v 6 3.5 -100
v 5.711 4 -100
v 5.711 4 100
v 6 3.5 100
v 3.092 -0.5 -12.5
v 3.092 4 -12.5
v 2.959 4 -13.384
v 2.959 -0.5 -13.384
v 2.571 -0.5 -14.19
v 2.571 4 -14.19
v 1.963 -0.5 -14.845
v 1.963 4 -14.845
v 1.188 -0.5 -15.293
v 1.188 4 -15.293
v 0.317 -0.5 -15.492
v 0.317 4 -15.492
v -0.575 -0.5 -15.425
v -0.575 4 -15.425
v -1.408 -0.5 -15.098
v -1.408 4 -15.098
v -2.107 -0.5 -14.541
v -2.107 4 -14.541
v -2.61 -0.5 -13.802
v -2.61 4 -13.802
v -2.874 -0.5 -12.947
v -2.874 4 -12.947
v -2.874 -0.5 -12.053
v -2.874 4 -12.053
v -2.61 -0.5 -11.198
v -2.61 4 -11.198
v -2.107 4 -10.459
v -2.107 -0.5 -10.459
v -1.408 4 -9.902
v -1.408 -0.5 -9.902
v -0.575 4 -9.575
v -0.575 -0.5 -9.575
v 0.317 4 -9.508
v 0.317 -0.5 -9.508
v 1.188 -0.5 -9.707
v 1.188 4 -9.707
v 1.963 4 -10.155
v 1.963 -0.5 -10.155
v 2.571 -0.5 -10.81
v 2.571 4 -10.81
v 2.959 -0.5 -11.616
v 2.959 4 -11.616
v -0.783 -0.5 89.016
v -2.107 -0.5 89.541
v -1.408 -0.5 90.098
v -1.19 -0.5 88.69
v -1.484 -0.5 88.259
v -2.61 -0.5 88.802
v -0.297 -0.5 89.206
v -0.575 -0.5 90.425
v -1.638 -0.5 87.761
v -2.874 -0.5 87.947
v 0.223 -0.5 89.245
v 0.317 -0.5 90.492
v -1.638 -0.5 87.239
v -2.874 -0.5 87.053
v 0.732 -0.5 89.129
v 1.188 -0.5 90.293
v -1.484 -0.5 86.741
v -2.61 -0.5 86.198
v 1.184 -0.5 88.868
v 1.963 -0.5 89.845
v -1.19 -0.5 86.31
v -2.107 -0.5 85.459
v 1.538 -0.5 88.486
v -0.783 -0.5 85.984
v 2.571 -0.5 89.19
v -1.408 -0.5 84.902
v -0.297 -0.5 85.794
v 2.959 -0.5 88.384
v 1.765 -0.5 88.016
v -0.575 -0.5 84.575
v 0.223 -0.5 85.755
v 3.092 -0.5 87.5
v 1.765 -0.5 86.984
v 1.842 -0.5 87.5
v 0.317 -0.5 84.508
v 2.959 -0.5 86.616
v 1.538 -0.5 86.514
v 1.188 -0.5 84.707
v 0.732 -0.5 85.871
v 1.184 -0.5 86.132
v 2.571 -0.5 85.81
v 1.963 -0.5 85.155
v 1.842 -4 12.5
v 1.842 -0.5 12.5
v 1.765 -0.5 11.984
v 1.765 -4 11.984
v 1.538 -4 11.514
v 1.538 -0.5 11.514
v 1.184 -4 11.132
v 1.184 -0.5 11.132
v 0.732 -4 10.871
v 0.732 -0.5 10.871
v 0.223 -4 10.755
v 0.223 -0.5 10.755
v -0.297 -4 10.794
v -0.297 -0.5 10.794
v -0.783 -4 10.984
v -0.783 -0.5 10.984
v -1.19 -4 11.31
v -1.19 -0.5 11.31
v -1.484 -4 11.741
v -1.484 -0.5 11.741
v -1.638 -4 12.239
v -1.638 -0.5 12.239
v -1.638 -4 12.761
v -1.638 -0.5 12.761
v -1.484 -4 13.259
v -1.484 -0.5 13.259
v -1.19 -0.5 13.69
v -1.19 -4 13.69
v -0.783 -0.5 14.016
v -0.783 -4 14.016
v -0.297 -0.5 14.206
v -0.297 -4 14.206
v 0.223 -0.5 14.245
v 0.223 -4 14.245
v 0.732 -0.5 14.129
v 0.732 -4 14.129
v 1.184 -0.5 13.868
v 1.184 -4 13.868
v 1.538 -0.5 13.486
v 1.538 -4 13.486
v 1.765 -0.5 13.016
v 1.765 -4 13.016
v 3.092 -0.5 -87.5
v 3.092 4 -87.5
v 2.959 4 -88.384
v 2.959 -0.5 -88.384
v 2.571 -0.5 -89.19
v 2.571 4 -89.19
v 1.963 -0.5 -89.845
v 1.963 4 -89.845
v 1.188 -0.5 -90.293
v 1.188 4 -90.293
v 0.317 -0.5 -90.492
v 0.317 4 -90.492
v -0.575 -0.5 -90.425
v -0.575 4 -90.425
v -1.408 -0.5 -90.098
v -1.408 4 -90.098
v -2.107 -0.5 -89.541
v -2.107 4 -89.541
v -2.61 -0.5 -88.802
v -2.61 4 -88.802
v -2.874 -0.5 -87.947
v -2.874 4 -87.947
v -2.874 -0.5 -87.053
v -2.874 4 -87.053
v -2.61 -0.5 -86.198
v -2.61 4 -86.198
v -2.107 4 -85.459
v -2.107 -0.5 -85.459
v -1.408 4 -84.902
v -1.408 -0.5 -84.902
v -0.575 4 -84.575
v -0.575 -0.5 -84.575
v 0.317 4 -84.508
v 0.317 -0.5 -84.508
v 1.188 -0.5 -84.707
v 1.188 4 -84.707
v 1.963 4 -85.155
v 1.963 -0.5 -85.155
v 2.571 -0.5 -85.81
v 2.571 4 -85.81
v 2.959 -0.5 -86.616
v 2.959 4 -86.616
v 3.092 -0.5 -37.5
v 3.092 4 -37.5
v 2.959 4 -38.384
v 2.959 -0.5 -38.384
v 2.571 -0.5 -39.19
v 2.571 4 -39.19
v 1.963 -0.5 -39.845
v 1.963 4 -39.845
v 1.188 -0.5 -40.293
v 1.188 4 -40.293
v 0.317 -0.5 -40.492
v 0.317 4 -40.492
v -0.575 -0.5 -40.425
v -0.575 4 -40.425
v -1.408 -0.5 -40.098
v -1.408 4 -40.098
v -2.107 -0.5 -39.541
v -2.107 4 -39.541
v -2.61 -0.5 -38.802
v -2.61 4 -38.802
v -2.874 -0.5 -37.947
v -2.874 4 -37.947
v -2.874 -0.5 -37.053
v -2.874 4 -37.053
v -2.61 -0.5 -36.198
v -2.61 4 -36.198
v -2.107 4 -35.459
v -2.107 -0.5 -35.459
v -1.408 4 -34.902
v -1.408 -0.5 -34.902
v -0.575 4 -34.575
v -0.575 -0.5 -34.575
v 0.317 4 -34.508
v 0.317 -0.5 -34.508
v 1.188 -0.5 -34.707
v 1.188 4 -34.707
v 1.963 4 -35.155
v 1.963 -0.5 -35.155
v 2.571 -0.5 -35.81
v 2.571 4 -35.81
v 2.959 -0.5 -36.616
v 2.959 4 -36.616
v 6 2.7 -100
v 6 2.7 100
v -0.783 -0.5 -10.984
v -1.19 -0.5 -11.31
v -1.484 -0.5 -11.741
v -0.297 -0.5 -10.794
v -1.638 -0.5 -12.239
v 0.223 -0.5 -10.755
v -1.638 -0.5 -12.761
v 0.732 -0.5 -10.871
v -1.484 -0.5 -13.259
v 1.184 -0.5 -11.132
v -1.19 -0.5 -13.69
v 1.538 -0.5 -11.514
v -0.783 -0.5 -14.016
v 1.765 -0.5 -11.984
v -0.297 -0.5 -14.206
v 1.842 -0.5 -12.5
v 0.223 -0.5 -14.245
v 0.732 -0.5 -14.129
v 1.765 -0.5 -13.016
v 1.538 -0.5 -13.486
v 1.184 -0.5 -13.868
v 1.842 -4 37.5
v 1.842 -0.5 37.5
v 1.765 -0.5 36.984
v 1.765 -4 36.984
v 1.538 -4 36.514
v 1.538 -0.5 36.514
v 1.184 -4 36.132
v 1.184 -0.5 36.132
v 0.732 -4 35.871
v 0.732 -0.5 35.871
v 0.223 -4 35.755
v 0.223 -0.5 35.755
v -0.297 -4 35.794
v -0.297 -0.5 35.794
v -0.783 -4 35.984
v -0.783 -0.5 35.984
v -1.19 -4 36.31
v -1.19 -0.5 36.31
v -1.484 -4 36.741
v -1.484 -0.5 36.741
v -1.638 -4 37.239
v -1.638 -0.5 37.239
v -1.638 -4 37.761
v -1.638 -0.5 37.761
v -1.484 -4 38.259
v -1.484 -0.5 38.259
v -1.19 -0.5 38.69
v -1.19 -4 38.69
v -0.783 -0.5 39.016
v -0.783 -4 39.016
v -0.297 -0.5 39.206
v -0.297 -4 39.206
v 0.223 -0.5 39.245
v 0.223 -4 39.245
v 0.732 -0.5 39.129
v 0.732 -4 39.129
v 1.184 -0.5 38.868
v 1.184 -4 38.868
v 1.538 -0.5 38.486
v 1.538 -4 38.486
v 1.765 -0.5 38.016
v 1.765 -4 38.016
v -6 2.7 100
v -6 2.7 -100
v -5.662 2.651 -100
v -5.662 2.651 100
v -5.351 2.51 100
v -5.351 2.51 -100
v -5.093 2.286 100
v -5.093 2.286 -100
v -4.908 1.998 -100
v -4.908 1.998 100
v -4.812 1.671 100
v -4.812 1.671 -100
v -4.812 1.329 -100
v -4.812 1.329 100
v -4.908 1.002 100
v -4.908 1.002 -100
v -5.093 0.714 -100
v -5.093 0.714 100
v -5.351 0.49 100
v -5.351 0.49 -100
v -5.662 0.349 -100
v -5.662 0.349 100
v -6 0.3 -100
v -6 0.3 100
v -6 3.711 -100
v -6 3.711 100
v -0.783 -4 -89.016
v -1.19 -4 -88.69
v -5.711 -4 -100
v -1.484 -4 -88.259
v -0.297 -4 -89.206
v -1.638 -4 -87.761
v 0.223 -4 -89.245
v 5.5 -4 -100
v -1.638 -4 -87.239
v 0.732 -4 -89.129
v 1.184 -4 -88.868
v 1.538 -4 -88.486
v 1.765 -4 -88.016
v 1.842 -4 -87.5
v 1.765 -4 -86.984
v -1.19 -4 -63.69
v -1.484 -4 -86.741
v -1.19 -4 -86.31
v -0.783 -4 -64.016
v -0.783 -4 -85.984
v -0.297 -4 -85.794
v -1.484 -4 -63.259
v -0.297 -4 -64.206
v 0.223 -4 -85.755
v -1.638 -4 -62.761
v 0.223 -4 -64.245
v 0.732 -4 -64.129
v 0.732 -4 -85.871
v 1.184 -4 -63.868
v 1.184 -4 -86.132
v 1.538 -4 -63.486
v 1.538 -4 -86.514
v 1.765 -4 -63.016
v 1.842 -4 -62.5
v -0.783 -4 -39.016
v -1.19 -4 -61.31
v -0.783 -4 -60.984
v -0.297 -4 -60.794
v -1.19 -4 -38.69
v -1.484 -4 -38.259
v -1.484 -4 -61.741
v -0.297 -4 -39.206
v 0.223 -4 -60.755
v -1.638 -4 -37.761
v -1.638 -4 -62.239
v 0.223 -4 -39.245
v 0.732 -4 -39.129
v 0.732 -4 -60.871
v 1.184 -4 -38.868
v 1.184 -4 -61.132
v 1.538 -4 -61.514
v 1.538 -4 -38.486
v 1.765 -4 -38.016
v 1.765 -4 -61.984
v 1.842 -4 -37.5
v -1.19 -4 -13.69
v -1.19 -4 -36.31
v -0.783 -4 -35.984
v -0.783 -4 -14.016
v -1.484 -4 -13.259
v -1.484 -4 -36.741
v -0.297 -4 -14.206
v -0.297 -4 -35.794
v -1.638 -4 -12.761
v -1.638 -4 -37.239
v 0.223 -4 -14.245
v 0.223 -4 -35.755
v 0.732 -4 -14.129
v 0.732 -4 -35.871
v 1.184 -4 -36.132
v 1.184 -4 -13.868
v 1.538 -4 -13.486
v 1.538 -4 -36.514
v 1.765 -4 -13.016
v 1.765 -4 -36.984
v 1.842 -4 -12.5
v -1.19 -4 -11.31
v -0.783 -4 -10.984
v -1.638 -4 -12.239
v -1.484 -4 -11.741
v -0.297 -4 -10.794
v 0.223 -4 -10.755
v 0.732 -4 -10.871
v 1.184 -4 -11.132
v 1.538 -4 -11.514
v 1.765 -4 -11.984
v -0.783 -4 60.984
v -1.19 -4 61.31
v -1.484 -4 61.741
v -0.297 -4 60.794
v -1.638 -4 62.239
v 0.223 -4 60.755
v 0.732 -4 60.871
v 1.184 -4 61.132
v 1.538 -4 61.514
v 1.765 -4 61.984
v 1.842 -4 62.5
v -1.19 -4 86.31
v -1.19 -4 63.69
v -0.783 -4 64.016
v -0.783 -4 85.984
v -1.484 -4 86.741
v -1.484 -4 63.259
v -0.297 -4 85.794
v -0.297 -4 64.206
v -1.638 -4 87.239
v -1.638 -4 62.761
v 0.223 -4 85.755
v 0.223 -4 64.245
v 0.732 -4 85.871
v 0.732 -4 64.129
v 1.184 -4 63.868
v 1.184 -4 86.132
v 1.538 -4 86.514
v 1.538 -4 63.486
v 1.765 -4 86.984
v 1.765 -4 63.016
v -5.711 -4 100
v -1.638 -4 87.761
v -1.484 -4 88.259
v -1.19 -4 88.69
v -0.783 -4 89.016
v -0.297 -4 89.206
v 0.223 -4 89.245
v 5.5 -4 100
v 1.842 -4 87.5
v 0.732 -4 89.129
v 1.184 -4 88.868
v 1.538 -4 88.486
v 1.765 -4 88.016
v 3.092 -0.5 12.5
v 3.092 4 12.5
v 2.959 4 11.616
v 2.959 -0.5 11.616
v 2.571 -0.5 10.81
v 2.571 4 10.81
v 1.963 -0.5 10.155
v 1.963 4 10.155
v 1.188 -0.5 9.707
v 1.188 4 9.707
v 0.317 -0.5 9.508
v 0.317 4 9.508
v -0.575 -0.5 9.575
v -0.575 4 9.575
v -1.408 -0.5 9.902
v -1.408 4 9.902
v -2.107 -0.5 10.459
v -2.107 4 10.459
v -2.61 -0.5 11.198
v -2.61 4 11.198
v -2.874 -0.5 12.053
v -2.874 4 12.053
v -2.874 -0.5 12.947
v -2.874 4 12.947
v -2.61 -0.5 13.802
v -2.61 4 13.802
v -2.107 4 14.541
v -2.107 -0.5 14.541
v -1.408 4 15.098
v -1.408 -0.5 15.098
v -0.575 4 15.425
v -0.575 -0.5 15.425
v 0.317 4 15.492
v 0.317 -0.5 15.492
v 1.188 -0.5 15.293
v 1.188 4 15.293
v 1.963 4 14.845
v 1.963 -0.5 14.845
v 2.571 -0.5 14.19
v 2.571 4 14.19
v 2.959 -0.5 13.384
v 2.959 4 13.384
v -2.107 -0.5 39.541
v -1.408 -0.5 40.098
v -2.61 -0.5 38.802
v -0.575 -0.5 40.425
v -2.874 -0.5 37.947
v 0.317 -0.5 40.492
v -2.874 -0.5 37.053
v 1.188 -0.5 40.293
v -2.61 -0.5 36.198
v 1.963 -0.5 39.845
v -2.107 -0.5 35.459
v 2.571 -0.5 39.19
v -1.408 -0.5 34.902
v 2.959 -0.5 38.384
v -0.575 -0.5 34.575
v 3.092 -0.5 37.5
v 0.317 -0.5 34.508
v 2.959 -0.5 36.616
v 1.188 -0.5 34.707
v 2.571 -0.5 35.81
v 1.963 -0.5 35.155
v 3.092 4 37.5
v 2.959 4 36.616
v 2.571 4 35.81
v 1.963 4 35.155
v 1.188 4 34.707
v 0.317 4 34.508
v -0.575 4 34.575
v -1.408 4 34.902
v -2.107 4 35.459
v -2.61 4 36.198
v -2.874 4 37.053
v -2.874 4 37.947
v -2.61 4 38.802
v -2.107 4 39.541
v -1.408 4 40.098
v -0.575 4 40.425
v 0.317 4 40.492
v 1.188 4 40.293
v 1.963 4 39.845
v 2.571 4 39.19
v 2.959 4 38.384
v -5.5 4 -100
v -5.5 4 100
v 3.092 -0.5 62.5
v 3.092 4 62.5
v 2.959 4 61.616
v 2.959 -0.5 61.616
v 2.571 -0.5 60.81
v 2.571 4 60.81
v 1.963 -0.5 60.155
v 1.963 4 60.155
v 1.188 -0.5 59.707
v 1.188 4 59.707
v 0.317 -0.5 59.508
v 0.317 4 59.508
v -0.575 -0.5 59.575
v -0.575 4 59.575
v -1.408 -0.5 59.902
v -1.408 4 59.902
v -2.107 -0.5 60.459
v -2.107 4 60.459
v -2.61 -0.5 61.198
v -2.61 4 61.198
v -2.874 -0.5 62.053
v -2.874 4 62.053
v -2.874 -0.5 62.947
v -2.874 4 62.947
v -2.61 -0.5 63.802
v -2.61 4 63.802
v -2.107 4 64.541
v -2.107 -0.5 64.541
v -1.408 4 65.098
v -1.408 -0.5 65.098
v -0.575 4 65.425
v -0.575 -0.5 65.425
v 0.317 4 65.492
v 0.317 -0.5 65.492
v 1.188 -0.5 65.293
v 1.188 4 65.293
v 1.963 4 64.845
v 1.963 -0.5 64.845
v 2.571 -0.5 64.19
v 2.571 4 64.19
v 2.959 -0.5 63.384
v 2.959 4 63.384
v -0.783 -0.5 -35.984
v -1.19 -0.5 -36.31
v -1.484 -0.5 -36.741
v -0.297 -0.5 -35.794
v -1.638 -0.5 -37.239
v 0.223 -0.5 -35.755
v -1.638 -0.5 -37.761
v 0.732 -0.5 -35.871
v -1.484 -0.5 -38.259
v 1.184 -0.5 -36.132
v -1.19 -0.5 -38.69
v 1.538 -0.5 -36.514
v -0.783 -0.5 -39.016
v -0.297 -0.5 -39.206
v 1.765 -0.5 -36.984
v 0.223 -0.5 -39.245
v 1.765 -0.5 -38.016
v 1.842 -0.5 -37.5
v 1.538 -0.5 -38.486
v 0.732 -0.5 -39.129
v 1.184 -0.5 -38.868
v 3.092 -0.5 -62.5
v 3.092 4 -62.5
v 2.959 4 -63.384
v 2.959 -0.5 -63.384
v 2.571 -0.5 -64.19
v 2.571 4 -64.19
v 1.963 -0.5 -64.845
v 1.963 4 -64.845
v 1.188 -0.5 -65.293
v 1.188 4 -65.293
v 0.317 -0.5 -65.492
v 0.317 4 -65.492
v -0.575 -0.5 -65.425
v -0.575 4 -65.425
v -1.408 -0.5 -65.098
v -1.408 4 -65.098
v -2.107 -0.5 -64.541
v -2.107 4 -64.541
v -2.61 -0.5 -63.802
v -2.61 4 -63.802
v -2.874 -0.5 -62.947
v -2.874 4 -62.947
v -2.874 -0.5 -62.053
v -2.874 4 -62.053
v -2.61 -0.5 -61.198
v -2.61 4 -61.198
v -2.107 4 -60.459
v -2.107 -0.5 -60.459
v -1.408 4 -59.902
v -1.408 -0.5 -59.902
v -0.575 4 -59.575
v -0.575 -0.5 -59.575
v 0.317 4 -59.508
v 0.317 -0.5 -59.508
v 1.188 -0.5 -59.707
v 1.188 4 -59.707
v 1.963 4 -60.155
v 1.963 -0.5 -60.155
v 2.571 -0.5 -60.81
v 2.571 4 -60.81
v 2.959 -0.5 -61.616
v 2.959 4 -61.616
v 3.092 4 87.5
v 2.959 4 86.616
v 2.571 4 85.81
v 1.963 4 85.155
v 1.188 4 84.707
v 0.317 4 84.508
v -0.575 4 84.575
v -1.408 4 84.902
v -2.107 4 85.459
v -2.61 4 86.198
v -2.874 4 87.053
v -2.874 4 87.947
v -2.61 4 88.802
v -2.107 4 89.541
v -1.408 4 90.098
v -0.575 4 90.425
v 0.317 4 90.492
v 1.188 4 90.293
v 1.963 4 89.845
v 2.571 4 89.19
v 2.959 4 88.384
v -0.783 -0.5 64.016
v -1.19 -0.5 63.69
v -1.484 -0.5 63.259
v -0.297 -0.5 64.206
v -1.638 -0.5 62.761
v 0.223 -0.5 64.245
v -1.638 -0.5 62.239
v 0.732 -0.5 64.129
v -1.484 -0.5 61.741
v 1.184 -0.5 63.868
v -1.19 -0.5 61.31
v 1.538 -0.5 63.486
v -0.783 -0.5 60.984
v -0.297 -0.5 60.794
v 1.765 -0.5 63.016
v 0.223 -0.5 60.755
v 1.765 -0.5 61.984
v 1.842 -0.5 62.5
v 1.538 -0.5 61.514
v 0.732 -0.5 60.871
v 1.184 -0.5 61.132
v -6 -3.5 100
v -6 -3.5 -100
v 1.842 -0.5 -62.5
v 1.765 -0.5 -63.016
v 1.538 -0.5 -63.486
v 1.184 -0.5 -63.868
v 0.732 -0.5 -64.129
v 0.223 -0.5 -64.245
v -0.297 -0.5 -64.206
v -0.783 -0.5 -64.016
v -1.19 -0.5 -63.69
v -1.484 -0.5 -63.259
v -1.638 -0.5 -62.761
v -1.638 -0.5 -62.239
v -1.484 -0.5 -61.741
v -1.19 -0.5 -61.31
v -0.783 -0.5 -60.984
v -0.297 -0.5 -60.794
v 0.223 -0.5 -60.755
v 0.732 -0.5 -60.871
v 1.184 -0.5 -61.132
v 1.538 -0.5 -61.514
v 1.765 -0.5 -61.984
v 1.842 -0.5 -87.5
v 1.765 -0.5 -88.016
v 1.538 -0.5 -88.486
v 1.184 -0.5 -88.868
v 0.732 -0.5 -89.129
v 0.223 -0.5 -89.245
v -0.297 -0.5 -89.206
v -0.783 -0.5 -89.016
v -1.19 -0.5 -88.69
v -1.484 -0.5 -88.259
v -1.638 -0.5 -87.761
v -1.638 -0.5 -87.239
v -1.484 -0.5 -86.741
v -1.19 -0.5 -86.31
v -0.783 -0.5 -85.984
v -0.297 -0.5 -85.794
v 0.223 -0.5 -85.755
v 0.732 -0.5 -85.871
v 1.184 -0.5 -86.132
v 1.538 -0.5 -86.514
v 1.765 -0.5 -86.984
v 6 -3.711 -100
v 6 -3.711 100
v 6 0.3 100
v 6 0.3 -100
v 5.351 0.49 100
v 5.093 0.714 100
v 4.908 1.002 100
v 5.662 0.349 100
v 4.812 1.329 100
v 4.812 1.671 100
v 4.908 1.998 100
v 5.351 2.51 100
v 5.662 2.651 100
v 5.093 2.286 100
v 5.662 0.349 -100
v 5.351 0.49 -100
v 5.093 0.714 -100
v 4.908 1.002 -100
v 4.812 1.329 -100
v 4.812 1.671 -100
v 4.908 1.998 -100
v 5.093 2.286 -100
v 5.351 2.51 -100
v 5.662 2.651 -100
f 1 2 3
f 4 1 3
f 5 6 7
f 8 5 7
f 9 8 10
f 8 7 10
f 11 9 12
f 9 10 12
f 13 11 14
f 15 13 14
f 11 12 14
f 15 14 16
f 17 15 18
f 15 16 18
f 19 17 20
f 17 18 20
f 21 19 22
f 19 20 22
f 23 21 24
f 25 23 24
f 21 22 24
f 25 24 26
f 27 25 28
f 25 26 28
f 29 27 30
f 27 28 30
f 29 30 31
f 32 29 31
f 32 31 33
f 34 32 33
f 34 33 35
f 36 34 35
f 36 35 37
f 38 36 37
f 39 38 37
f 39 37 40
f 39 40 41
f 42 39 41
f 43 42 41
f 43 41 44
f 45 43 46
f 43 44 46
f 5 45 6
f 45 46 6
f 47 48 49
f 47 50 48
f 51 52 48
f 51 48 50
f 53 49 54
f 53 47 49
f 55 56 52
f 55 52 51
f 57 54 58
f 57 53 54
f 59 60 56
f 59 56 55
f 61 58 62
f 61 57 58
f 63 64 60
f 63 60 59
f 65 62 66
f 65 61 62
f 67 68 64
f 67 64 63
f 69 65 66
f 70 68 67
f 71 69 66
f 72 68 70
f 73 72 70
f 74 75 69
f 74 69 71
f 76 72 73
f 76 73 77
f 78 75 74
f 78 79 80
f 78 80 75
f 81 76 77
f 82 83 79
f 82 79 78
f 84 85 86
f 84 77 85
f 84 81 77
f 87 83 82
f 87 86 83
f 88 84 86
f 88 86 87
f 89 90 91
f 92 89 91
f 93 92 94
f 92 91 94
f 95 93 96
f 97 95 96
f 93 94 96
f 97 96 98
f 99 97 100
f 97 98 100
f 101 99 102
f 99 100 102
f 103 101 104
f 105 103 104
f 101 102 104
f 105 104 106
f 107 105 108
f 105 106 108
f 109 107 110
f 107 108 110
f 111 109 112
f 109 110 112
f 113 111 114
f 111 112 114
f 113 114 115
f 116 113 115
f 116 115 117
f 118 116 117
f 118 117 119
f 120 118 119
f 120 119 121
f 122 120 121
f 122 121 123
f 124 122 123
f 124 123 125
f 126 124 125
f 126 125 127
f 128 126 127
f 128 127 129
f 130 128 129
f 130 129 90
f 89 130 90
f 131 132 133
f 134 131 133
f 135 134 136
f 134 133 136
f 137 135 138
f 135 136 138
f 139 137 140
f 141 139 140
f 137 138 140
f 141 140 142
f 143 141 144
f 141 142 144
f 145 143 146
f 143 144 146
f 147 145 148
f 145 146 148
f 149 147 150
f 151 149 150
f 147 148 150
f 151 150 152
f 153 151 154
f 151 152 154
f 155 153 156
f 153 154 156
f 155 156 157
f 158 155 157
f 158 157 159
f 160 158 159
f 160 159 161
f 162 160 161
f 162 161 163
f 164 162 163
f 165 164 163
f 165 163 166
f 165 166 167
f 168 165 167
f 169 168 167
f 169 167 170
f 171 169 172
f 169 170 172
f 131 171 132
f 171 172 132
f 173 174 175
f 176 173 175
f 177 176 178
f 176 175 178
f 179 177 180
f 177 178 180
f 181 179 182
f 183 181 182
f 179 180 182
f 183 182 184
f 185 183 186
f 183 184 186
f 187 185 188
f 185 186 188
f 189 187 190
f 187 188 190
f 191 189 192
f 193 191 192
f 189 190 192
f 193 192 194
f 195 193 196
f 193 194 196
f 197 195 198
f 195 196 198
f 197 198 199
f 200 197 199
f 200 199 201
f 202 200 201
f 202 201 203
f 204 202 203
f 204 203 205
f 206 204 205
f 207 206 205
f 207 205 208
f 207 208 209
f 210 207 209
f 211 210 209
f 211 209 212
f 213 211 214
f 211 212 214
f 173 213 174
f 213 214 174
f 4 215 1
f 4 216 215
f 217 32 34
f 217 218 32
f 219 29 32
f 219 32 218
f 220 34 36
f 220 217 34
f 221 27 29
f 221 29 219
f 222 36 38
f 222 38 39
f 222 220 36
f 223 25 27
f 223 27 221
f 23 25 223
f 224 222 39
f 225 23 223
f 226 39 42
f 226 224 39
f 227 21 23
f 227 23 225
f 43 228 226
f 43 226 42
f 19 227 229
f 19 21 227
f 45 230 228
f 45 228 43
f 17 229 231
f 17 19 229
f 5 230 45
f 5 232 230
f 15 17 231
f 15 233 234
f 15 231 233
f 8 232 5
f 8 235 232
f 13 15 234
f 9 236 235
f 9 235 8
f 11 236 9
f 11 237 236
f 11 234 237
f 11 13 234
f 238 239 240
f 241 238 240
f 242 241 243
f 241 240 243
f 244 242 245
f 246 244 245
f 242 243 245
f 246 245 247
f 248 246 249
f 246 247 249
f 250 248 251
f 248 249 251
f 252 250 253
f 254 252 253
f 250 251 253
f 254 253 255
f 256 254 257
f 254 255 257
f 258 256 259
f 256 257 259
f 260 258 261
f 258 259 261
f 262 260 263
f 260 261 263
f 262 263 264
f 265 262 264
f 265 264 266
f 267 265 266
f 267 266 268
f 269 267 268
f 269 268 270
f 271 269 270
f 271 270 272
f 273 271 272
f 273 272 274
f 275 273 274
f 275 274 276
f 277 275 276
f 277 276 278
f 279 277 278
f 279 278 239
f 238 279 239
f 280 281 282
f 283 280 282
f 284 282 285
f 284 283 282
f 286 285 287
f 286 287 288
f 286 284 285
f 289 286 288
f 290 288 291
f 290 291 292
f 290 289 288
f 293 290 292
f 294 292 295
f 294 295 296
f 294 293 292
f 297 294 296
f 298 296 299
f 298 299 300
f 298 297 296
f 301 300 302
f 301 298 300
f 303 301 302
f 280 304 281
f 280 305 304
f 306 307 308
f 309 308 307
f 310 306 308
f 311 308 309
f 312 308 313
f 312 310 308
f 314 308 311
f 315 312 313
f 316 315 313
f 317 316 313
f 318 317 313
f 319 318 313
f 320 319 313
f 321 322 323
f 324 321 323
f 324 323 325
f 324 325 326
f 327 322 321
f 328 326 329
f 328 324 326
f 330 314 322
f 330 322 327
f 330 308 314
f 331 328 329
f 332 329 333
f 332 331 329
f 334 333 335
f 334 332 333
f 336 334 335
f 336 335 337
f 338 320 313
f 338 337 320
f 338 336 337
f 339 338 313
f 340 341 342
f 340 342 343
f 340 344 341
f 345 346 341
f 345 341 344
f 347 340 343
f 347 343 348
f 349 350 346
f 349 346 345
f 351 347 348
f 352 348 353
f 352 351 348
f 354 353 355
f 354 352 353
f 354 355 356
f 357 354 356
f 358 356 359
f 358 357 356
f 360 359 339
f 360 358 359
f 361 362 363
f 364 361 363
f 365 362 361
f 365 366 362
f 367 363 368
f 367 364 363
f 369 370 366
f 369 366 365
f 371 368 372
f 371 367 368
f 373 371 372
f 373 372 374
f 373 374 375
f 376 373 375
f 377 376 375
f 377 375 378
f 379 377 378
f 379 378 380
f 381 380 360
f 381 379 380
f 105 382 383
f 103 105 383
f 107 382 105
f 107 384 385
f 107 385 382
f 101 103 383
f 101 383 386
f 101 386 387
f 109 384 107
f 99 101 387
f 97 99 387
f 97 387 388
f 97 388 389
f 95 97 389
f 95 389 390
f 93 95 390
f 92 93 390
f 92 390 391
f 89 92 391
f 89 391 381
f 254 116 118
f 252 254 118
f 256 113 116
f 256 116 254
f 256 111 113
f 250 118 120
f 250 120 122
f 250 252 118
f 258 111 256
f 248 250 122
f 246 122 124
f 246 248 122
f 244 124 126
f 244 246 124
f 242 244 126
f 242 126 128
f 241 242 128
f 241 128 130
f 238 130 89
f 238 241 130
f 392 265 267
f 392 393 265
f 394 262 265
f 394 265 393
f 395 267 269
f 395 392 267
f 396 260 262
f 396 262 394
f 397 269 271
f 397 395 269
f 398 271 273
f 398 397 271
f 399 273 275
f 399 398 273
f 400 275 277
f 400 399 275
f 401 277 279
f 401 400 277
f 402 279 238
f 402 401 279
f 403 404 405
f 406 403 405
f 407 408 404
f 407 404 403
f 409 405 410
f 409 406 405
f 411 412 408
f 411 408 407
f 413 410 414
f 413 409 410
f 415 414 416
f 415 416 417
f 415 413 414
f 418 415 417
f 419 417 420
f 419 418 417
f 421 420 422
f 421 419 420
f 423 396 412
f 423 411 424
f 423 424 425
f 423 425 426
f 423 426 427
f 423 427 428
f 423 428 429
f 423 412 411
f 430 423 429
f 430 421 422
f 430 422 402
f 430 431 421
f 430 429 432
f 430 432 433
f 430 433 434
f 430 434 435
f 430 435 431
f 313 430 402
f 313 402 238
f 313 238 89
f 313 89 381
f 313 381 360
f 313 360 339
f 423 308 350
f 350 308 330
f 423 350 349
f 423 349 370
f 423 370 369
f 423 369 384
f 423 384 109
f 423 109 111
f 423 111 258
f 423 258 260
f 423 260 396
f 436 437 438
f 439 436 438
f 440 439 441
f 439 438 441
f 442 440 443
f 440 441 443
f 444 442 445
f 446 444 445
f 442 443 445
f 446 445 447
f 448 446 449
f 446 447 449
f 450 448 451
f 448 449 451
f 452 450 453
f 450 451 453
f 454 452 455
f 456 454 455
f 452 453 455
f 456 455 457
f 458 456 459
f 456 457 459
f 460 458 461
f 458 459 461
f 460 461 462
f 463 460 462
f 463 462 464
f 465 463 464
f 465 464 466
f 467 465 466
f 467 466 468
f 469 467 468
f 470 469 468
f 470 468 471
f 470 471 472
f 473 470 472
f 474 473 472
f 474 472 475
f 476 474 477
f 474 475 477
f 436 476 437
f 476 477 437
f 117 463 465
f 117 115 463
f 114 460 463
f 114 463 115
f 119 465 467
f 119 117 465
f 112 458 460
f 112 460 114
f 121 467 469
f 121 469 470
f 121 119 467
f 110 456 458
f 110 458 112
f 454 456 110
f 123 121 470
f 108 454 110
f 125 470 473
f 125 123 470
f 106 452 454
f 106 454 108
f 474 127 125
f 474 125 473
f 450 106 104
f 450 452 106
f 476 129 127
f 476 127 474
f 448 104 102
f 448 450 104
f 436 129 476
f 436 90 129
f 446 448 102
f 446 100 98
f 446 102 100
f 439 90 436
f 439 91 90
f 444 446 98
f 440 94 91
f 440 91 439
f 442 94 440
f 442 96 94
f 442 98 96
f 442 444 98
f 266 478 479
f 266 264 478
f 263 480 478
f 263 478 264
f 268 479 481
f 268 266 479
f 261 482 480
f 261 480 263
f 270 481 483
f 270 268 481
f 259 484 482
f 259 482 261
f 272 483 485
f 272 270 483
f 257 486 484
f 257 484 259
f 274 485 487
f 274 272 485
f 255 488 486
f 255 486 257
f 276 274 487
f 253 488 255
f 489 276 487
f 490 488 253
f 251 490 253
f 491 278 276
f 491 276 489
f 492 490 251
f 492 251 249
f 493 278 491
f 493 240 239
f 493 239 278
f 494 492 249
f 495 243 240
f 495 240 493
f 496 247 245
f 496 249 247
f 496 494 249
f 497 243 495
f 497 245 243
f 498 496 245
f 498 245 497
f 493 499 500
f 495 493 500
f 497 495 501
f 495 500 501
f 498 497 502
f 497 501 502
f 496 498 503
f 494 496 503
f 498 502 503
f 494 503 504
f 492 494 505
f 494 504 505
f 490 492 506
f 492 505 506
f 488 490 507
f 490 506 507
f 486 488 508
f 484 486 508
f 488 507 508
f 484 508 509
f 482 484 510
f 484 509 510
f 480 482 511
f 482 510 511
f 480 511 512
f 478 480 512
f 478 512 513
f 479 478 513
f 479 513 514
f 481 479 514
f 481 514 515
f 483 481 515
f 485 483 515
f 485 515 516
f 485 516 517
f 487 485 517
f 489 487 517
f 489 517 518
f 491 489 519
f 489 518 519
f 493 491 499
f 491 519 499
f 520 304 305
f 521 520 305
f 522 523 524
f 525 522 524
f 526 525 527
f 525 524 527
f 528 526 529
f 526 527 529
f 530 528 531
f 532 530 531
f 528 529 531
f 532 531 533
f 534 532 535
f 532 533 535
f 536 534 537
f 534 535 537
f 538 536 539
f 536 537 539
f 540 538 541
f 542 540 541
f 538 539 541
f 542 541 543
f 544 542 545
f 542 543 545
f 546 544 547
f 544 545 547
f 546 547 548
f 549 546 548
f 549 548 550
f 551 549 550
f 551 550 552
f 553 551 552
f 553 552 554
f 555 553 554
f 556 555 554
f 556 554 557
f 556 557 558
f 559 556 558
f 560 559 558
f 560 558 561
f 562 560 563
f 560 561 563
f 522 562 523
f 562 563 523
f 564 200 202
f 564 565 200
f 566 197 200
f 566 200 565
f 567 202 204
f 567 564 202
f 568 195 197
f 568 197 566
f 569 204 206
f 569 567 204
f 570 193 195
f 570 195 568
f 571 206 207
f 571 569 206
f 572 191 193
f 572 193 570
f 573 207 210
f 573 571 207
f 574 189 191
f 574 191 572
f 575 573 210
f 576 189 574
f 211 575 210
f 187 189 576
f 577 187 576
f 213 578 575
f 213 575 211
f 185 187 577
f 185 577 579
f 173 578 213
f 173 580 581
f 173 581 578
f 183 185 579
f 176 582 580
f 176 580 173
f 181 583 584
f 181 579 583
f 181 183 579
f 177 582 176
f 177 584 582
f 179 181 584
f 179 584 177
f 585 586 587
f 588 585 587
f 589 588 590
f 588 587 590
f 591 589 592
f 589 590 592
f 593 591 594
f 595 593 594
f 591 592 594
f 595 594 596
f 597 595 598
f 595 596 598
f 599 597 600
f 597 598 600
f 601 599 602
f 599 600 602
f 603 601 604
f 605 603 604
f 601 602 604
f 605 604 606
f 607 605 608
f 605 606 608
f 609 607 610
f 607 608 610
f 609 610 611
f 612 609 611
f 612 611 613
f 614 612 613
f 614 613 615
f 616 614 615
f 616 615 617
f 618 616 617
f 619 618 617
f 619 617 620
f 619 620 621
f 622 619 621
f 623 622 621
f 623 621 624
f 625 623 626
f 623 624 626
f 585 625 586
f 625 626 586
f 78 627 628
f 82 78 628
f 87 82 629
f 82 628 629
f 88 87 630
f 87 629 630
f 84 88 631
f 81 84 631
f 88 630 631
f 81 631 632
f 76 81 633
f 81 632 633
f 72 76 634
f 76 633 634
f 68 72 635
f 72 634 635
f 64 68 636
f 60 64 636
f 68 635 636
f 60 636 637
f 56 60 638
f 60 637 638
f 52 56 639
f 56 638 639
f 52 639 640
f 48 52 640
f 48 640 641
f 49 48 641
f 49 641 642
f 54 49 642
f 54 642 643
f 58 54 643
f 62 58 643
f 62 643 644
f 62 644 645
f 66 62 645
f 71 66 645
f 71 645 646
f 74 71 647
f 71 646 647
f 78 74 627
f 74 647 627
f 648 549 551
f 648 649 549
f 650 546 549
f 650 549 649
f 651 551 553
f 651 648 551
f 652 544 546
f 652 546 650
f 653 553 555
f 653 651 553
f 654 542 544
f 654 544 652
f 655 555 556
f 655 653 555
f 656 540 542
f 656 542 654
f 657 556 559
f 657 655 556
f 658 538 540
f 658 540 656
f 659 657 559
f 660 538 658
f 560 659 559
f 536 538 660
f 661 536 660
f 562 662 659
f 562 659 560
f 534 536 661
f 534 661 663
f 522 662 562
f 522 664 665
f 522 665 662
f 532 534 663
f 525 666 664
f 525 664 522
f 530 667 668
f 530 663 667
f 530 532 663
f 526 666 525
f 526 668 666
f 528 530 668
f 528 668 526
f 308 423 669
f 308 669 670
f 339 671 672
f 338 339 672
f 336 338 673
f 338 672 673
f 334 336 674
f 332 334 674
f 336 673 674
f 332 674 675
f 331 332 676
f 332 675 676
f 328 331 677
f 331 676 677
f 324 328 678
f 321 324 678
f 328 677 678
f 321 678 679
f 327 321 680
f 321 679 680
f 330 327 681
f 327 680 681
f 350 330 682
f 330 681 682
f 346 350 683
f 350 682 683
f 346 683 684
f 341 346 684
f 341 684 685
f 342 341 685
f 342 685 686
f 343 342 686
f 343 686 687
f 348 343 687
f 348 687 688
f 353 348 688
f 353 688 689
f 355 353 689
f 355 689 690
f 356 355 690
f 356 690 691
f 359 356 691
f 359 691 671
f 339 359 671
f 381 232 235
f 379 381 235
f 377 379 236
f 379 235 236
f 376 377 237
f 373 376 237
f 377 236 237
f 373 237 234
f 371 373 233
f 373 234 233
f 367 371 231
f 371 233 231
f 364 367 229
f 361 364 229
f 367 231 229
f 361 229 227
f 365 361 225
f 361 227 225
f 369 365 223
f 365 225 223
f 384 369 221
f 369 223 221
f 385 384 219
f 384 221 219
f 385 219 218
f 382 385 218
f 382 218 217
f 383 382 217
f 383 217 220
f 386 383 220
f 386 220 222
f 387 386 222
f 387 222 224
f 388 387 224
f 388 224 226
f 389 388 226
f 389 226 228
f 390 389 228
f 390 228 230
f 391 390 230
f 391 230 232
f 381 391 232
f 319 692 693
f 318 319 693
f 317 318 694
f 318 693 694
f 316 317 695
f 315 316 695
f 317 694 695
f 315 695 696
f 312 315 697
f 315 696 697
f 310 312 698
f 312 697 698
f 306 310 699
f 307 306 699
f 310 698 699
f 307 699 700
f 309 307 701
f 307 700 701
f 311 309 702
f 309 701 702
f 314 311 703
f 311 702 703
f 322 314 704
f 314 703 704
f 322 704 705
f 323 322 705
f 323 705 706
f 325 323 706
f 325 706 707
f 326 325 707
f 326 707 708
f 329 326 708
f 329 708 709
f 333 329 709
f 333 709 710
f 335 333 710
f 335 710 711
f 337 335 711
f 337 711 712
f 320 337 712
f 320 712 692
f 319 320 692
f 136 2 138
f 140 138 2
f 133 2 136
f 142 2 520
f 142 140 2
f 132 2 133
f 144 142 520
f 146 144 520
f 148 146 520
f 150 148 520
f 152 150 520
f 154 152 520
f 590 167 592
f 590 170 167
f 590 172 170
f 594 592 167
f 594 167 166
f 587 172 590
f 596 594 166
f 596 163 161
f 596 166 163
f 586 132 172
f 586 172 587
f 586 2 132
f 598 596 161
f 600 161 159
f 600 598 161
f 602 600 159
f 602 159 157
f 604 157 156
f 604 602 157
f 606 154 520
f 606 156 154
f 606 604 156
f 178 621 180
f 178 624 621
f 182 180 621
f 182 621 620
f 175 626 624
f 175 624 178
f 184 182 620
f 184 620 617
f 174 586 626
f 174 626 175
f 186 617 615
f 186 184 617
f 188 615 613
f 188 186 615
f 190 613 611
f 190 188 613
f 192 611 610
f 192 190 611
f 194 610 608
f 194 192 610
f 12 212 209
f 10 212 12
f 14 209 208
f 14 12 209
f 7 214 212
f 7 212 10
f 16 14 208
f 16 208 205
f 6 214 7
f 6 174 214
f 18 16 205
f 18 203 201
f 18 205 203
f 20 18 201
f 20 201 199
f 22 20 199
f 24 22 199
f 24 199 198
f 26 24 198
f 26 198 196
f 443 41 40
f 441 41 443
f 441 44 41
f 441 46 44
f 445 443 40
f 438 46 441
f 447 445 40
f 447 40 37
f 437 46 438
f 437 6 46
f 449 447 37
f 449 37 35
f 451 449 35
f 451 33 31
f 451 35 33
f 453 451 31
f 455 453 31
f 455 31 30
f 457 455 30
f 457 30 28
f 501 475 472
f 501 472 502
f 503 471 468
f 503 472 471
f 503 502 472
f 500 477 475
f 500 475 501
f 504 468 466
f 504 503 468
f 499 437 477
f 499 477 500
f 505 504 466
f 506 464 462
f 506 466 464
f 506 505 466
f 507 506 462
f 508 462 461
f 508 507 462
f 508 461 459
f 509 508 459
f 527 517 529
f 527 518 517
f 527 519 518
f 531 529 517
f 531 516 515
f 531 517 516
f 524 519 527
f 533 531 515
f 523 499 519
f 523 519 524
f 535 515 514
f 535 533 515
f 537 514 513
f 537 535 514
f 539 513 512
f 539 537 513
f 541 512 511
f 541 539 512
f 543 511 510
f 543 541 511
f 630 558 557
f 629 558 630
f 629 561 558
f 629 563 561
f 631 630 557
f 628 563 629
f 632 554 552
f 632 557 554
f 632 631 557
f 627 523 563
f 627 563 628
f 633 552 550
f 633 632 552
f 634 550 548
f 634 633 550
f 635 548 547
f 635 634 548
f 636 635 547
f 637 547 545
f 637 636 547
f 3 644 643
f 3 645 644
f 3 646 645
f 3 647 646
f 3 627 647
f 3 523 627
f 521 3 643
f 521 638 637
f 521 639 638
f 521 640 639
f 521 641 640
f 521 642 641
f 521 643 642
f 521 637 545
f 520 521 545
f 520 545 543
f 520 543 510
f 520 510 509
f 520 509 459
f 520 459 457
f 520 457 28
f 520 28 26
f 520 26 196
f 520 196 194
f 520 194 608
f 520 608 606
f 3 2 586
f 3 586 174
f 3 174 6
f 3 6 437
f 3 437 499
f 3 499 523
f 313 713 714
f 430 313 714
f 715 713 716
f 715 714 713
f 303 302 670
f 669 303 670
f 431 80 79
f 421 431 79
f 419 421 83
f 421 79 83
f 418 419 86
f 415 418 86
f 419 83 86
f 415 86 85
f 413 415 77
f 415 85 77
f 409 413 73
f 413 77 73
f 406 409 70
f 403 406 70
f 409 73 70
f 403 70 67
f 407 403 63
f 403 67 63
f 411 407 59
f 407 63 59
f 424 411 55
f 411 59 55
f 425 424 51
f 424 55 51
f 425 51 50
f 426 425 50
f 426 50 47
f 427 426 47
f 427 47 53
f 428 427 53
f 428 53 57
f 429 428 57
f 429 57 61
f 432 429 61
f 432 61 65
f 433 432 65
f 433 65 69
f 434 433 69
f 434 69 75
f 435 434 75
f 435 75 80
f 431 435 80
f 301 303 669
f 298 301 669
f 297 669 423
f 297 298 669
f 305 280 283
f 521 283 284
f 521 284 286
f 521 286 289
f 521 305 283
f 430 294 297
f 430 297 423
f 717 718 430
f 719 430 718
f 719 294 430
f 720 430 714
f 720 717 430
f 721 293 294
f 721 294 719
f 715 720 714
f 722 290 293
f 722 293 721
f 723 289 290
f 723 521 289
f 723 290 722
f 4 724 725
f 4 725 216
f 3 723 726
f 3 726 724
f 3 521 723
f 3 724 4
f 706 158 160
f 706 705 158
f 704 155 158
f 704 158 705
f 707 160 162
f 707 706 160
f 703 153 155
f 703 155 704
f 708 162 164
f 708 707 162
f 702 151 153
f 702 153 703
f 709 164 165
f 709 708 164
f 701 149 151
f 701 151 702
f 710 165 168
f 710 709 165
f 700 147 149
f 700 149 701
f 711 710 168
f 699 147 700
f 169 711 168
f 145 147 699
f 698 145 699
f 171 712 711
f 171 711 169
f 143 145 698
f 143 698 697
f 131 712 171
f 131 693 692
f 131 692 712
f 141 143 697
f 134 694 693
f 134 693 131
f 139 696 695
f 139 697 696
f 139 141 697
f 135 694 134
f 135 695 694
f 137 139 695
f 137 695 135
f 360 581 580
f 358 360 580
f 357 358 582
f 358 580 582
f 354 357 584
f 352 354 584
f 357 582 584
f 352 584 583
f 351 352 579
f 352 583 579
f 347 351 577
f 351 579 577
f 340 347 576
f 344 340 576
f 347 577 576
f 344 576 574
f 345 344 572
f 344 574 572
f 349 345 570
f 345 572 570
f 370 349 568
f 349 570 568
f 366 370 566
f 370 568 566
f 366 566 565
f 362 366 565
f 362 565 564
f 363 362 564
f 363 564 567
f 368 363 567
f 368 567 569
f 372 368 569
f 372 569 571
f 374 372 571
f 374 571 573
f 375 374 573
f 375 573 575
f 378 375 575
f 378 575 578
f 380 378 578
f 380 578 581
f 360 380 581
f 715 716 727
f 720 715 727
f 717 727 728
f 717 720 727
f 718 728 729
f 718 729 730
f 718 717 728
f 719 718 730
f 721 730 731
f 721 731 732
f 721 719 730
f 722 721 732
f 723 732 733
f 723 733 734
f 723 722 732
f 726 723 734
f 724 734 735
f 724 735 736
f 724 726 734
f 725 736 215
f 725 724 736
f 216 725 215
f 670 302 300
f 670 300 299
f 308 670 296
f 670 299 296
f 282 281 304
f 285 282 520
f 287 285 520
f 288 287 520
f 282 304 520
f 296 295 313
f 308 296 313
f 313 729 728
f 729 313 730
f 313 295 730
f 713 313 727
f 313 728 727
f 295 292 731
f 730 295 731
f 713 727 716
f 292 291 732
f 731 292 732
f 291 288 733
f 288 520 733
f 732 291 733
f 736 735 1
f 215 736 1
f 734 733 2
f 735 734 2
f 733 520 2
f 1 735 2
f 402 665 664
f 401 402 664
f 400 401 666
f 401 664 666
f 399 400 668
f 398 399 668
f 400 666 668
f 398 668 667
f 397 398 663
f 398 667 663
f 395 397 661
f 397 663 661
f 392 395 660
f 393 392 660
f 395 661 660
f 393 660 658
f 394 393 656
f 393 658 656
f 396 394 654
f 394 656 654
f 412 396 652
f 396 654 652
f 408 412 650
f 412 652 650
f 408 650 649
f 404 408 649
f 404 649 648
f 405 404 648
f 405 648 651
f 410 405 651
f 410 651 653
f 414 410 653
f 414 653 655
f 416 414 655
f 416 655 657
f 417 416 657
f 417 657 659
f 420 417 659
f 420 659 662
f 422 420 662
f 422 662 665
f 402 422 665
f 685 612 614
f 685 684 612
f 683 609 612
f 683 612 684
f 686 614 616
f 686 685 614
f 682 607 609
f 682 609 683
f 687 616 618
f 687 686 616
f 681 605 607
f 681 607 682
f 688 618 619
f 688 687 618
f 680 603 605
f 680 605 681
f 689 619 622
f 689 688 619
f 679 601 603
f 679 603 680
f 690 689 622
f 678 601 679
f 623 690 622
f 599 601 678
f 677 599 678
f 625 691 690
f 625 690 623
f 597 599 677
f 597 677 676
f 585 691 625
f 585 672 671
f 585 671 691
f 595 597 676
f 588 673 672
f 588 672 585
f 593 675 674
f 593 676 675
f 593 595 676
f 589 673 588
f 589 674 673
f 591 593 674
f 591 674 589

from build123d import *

# Parameters (mm, degrees)
BOSS_EXTRUDE1_DEPTH   = 100
CHAMFER1_SIZE         = 0.5
CHAMFER1_SIZE2        = 0.288675135
CHAMFER1_PART_2_SIZE  = 0.5
CHAMFER1_PART_2_SIZE2 = 0.288675135
CHAMFER1_PART_3_SIZE  = 0.5
CHAMFER1_PART_3_SIZE2 = 0.288675135
CHAMFER1_PART_4_SIZE  = 0.5
CHAMFER1_PART_4_SIZE2 = 0.288675135
SKETCH2_R             = 1.75
CUT_EXTRUDE1_DEPTH    = 8
SKETCH3_R             = 3
CUT_EXTRUDE2_DEPTH    = 4.5
LPATTERN1_COUNT       = 8
LPATTERN1_PITCH       = 25


with BuildPart() as part:
    # Sketch1 → Boss-Extrude1 (new body, symmetric)
    with BuildSketch(Plane.XY):
        with BuildLine():
            Line((-6, -4), (6, -4))
            Line((6, -4), (6, 0.3))
            ThreePointArc((6, 0.3), (4.8, 1.5), (6, 2.7))
            Line((6, 2.7), (6, 4))
            Line((6, 4), (-6, 4))
            Line((-6, 4), (-6, 2.7))
            ThreePointArc((-6, 2.7), (-4.8, 1.5), (-6, 0.3))
            Line((-6, 0.3), (-6, -4))
        make_face()
    extrude(amount=BOSS_EXTRUDE1_DEPTH, both=True)

    # Chamfer1
    chamfer1_edges = [part.edges().sort_by_distance(p)[0] for p in [
        (6, -4, 0),
    ]]
    chamfer1_side = [part.faces().sort_by_distance(p)[0] for p in [
        (0, -4, 0),
    ]]
    chamfer(chamfer1_edges, length=CHAMFER1_SIZE, length2=CHAMFER1_SIZE2, reference=chamfer1_side[0])

    # Chamfer1 part 2
    chamfer1_part_2_edges = [part.edges().sort_by_distance(p)[0] for p in [
        (-6, -4, 0),
    ]]
    chamfer1_part_2_side = [part.faces().sort_by_distance(p)[0] for p in [
        (-6, -1.85, 0),
    ]]
    chamfer(chamfer1_part_2_edges, length=CHAMFER1_PART_2_SIZE, length2=CHAMFER1_PART_2_SIZE2, reference=chamfer1_part_2_side[0])

    # Chamfer1 part 3
    chamfer1_part_3_edges = [part.edges().sort_by_distance(p)[0] for p in [
        (-6, 4, 0),
    ]]
    chamfer1_part_3_side = [part.faces().sort_by_distance(p)[0] for p in [
        (0, 4, 0),
    ]]
    chamfer(chamfer1_part_3_edges, length=CHAMFER1_PART_3_SIZE, length2=CHAMFER1_PART_3_SIZE2, reference=chamfer1_part_3_side[0])

    # Chamfer1 part 4
    chamfer1_part_4_edges = [part.edges().sort_by_distance(p)[0] for p in [
        (6, 4, 0),
    ]]
    chamfer1_part_4_side = [part.faces().sort_by_distance(p)[0] for p in [
        (6, 3.35, 0),
    ]]
    chamfer(chamfer1_part_4_edges, length=CHAMFER1_PART_4_SIZE, length2=CHAMFER1_PART_4_SIZE2, reference=chamfer1_part_4_side[0])

    # Sketch2 → Cut-Extrude1 (cut)
    with BuildSketch(Plane(origin=(0, 4, 0), x_dir=(1, 0, 0), z_dir=(0, 1, 0))):
        with Locations((0.092454629, -87.5)):
            Circle(SKETCH2_R)
    cut_extrude1 = extrude(amount=-CUT_EXTRUDE1_DEPTH, mode=Mode.SUBTRACT)

    # Sketch3 → Cut-Extrude2 (cut)
    with BuildSketch(Plane(origin=(0, 4, 0), x_dir=(1, 0, 0), z_dir=(0, 1, 0))):
        with Locations((0.092454629, -87.5)):
            Circle(SKETCH3_R)
    cut_extrude2 = extrude(amount=-CUT_EXTRUDE2_DEPTH, mode=Mode.SUBTRACT)

    # LPattern1: Cut-Extrude1, Cut-Extrude2 ×8
    with Locations(*[(0, 0, -i * LPATTERN1_PITCH) for i in range(1, LPATTERN1_COUNT)]):
        add(cut_extrude1, mode=Mode.SUBTRACT)
        add(cut_extrude2, mode=Mode.SUBTRACT)


solid = part.part
